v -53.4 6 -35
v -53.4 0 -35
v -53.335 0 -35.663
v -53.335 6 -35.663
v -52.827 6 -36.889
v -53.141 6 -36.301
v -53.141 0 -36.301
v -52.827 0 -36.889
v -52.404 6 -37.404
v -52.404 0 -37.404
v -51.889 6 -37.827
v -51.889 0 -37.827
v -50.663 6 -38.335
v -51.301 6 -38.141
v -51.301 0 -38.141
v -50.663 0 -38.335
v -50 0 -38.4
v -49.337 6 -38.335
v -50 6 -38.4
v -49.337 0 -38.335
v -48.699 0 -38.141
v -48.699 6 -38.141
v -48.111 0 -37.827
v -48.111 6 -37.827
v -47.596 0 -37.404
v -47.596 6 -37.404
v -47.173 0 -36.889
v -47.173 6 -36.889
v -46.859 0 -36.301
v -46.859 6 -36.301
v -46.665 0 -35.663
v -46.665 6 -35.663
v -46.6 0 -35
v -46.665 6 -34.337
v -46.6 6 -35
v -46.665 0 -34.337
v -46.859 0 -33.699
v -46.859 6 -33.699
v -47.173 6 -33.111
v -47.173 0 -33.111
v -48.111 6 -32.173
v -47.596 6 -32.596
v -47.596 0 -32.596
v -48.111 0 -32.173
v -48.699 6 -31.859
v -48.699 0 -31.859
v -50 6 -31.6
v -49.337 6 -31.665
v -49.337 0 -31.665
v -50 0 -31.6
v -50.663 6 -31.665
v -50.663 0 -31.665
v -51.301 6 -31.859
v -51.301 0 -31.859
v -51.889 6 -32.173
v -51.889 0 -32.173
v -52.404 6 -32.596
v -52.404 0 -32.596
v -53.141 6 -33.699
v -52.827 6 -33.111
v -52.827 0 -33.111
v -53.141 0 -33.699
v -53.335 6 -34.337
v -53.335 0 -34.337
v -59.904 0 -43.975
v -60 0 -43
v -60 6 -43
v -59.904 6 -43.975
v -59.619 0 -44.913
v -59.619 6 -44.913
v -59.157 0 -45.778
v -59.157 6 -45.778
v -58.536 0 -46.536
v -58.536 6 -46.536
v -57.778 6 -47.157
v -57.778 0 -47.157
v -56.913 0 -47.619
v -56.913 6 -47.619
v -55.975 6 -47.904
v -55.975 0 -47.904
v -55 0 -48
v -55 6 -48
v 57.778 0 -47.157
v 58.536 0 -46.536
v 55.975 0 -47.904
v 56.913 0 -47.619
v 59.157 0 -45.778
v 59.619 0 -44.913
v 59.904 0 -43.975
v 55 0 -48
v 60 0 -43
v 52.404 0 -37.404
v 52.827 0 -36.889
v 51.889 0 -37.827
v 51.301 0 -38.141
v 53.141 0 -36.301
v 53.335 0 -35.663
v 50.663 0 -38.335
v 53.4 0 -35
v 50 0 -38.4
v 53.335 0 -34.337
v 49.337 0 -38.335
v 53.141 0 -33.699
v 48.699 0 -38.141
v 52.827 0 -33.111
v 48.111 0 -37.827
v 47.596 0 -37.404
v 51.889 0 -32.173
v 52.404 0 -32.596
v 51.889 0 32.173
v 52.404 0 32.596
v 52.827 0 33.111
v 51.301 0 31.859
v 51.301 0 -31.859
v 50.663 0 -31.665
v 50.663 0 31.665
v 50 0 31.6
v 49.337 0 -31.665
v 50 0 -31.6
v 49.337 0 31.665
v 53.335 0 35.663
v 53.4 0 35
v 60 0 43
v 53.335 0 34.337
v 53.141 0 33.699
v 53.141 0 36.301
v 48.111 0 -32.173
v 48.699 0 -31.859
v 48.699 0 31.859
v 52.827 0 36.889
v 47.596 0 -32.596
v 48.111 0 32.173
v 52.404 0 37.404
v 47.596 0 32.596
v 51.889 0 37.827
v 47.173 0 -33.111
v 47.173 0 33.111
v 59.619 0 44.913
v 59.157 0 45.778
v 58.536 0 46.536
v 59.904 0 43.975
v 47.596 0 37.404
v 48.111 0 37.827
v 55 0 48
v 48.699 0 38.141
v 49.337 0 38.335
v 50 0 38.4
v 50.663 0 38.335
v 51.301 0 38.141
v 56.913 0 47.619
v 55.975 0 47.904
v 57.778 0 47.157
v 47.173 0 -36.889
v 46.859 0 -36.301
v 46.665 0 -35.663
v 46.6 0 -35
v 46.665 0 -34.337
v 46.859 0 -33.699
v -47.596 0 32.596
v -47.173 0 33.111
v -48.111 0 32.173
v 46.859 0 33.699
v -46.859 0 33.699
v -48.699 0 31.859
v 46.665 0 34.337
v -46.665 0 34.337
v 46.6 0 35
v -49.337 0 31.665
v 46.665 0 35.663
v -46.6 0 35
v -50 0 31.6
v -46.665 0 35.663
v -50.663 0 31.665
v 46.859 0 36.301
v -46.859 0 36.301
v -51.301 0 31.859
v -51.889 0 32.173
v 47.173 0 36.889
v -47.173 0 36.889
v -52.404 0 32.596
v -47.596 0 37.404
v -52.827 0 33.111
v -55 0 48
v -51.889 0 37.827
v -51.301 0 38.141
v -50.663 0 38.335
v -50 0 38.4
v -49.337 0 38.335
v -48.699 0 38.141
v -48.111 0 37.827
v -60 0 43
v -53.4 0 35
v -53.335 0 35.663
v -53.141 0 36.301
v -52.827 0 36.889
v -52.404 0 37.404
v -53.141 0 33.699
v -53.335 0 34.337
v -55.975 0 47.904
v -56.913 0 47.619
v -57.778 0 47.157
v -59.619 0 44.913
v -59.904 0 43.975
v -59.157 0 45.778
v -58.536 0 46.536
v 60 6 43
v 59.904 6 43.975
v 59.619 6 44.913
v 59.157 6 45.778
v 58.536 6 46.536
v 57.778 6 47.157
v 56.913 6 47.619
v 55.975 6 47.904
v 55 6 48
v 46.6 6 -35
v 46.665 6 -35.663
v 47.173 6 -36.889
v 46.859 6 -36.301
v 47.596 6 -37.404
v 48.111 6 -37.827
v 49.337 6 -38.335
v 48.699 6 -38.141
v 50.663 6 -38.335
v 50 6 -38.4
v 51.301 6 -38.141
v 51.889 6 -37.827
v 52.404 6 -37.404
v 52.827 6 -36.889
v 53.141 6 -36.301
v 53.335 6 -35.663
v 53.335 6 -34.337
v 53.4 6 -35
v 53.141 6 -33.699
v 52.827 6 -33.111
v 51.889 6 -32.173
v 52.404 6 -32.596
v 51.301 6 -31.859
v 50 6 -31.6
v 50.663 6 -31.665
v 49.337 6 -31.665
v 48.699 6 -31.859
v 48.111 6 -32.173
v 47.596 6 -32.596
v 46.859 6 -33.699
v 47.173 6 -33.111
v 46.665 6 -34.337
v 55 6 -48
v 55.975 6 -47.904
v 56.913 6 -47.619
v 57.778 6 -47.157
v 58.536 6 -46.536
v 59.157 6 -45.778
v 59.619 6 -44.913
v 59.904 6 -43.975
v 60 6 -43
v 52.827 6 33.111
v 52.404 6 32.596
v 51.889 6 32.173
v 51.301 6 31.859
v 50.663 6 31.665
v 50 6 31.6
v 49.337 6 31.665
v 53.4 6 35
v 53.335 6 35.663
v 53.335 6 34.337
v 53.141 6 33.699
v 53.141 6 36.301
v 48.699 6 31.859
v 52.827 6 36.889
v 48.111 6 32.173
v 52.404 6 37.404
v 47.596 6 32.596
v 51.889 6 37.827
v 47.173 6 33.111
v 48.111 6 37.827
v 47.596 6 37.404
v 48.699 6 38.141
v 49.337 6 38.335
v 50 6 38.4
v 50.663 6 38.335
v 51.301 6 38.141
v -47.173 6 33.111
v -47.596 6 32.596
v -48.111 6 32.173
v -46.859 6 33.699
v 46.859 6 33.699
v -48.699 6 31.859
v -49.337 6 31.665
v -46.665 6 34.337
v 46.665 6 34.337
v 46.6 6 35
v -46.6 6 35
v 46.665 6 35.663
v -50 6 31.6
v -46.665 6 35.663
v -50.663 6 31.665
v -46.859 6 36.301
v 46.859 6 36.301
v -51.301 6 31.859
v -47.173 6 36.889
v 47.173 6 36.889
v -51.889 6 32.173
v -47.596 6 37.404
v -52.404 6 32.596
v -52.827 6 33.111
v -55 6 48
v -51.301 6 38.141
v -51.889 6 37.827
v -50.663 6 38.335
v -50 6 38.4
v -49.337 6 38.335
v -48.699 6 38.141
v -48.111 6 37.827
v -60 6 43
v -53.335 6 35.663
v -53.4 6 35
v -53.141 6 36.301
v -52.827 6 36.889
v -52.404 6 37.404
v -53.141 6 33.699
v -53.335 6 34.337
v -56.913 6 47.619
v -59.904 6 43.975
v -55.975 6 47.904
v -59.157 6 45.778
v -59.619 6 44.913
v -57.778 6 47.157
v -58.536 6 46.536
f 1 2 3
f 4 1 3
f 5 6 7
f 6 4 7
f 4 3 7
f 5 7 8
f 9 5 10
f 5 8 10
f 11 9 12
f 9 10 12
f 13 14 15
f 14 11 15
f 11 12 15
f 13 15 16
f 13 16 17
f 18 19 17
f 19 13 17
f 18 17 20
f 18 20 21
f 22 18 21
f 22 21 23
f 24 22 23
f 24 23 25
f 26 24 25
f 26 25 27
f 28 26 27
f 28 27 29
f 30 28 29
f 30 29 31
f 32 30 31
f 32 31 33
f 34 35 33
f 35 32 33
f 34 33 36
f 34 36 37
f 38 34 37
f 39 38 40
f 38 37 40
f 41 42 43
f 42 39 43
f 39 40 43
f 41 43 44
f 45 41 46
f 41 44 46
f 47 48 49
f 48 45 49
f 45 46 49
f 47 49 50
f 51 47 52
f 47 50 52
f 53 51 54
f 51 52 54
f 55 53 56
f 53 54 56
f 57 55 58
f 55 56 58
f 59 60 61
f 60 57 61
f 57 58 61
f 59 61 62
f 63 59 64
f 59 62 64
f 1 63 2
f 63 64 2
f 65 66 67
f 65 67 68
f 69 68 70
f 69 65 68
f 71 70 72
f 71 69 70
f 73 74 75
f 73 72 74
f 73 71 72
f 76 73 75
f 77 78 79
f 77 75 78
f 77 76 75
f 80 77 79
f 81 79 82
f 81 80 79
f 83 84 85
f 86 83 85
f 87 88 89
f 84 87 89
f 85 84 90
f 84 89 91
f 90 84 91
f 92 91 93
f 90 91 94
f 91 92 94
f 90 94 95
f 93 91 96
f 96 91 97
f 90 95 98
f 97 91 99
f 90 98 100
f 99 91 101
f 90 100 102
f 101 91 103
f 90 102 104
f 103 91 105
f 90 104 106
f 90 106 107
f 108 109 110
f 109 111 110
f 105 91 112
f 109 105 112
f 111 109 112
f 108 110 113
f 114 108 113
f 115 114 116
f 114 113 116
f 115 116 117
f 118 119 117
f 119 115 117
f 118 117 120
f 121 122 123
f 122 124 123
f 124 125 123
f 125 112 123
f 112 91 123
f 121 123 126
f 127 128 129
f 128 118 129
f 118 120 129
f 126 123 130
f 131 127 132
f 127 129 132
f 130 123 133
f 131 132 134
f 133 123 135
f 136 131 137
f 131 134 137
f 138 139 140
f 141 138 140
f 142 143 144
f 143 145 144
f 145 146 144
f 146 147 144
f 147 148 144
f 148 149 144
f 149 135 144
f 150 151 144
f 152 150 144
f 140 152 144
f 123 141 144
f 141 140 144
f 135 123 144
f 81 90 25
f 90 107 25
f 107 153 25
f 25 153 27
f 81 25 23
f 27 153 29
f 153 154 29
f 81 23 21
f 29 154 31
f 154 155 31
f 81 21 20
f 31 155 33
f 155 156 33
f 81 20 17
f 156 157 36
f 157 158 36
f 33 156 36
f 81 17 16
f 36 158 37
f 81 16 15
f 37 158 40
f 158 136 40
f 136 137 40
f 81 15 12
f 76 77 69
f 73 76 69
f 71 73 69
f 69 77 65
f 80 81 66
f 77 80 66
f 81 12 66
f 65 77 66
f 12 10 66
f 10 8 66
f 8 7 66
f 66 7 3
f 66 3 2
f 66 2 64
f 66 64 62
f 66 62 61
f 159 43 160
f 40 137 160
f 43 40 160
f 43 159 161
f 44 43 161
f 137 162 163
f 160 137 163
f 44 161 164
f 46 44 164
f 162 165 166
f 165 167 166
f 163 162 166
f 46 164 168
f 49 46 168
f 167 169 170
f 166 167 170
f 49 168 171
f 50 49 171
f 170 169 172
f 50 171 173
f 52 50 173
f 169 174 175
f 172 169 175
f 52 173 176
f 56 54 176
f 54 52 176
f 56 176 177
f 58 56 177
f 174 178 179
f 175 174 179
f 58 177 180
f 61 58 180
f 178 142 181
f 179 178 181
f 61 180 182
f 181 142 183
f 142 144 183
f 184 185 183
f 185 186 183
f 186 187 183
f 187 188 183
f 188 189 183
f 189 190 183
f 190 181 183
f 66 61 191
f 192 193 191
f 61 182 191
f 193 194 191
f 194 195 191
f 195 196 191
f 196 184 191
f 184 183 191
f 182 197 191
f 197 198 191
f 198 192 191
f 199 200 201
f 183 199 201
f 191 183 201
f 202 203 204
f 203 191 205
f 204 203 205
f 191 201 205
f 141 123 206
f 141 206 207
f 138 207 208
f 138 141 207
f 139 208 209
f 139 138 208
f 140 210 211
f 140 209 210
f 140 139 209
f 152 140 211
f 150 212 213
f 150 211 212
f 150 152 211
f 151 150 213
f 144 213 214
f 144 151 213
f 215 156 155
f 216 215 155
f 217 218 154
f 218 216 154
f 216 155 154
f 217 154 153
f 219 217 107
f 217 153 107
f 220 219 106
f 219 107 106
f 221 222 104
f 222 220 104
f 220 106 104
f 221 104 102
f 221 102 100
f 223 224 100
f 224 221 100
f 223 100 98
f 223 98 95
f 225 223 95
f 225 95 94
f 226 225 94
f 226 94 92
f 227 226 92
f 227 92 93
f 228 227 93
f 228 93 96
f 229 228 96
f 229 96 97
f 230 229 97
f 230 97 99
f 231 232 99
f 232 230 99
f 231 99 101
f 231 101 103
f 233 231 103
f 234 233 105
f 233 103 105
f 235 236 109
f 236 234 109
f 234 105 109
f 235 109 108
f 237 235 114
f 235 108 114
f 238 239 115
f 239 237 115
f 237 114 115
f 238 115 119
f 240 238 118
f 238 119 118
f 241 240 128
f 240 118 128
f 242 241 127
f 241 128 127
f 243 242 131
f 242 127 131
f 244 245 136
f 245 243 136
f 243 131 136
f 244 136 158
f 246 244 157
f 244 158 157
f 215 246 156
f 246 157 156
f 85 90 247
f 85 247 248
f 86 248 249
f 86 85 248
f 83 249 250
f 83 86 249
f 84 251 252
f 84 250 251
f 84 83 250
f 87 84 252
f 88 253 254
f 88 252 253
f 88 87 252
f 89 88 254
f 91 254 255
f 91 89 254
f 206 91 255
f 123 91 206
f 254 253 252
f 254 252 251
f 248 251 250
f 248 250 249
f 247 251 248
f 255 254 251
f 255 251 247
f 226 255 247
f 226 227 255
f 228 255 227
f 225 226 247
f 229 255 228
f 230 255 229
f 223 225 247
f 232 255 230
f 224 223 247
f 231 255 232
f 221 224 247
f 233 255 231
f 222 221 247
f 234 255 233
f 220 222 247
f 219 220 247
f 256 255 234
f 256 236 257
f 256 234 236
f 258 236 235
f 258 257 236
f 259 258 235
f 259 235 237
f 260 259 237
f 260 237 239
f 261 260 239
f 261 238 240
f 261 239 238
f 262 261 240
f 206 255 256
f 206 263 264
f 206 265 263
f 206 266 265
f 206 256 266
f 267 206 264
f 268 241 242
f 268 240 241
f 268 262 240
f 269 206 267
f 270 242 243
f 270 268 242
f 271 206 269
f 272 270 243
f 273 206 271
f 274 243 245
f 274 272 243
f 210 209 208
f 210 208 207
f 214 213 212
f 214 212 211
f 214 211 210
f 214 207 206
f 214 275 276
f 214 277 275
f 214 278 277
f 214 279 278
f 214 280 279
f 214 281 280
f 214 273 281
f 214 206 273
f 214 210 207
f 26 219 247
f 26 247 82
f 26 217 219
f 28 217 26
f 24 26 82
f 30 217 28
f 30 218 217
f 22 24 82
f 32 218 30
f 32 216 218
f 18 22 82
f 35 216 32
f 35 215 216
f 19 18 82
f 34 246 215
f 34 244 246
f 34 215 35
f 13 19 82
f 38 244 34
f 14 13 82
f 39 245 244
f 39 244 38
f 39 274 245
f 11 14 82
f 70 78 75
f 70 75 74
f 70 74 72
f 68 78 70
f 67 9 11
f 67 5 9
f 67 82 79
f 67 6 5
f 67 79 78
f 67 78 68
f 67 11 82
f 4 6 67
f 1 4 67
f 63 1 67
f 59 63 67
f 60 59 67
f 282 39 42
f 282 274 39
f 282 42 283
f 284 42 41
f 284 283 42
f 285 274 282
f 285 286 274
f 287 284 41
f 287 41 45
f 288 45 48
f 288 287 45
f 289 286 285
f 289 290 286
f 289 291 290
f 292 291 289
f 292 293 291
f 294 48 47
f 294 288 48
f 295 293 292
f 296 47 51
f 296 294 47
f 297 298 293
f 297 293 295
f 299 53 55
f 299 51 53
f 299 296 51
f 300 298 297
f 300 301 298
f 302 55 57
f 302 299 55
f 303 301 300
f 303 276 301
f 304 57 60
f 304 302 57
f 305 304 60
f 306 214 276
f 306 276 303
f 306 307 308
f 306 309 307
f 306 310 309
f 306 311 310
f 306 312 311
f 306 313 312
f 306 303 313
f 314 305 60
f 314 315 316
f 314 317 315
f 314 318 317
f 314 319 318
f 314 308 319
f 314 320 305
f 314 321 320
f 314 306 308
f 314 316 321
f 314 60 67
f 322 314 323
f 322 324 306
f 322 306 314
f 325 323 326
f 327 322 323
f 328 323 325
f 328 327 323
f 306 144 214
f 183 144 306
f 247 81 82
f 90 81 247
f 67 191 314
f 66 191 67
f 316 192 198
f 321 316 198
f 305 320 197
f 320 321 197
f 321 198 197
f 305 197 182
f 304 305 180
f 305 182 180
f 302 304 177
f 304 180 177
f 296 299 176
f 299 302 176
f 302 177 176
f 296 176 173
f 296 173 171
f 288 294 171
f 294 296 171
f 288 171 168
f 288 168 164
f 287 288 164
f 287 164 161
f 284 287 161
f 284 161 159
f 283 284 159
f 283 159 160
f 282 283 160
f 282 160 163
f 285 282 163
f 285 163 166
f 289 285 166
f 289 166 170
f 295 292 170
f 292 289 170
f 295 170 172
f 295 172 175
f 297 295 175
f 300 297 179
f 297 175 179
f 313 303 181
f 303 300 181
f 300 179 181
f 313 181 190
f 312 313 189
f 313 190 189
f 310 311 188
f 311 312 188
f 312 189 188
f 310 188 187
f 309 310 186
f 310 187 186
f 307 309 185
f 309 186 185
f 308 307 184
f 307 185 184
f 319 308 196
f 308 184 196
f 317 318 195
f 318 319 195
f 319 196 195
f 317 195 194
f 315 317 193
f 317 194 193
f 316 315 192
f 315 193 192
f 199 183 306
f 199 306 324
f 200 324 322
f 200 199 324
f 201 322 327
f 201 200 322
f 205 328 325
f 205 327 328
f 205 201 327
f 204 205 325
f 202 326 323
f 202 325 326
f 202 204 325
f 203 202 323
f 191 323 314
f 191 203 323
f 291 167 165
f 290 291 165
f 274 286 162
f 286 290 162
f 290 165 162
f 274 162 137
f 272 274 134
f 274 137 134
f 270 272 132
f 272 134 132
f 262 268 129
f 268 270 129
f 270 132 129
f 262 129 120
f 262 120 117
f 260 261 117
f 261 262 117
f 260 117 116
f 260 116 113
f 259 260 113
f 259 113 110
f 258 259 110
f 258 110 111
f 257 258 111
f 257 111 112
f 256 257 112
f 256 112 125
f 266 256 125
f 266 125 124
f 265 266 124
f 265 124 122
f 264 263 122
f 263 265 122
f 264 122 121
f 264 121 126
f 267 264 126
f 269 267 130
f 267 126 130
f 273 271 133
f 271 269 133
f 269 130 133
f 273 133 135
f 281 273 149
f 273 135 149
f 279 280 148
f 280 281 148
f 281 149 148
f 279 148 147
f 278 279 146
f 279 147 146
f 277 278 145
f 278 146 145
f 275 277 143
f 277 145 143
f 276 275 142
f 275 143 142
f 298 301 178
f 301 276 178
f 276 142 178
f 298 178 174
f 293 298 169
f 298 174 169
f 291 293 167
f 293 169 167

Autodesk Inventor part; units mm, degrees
ref_plane "YZ Plane" through (0, 0, 0) normal (1, 0, 0) x (0, 1, 0)
ref_plane "XZ Plane" through (0, 0, 0) normal (0, 1, 0) x (-1, 0, 0)
ref_plane "XY Plane" through (0, 0, 0) normal (0, 0, 1) x (1, 0, 0)
sketch "Sketch1" plane through (0, 0, 0) normal (0, 1, 0) x (-1, 0, 0)
  line L0 (55, -48) -> (-55, -48)
  line L1 (-60, -43) -> (-60, 43)
  line L2 (-55, 48) -> (55, 48)
  line L3 (60, 43) -> (60, -43)
  line L4 (50, -35) -> (-50, -35) construction
  line L5 (-50, -35) -> (-50, 35) construction
  line L6 (-50, 35) -> (50, 35) construction
  line L7 (50, 35) -> (50, -35) construction
  arc A0 (60, 43) -> (55, 48) centre (55, 43) ccw
  arc A1 (-55, 48) -> (-60, 43) centre (-55, 43) ccw
  arc A2 (-60, -43) -> (-55, -48) centre (-55, -43) ccw
  arc A3 (55, -48) -> (60, -43) centre (55, -43) ccw
  circle A4 centre (50, -35) radius 3.4
  circle A5 centre (50, 35) radius 3.4
  circle A6 centre (-50, -35) radius 3.4
  circle A7 centre (-50, 35) radius 3.4
  line L8 (0, -20) -> (0, 20) construction
  line L9 (25, -20) -> (25, 20) construction
  line L10 (-25, 20) -> (-25, -20) construction
  arc A8 (-25, -20) -> (25, -20) centre (0, -20) ccw construction
  arc A9 (25, 20) -> (-25, 20) centre (0, 20) ccw construction
  point P0 (0, 0)
  point P1 (-60, 0)
  point P2 (0, -48)
  point P3 (0, -35)
  point P4 (-50, 0)
  point P5 (0, 0)
  dimension "d0" = 96
  dimension "d1" = 120
  dimension "d2" = 70
  dimension "d3" = 100
  dimension "d4" = 5
  dimension "d5" = 6.8
  dimension "d6" = 6.8
  dimension "d8" = 6.8
  dimension "d10" = 6.8
  dimension "d13" = 25
  dimension "d14" = 40
extrude "Extrusion1" add sketch "Sketch1" along normal blind 6
equation "\"d0\" = moduleHeight"
equation "\"d1\" = moduleWidth"
equation "\"d2\" = moduleMountH"
equation "\"d3\" = moduleMountW"
equation "\"d4\" = moduleCornerR"
equation "\"d5\" = moduleMountD"
equation "\"d6\" = moduleMountD"
equation "\"d8\" = moduleMountD"
equation "\"d10\" = moduleMountD"
equation "\"d13\" = moduleOpeningR"
equation "\"d14\" = moduleOpeningH"
equation "\"d15\" = thickness"
equation "\"moduleWidth\" = 120"
equation "\"moduleHeight\" = 96"
equation "\"moduleMountW\" = 100"
equation "\"moduleMountH\" = 70"
equation "\"moduleMountD\" = 6.8"
equation "\"moduleCornerR\" = 5"
equation "\"moduleOpeningR\" = 25"
equation "\"moduleOpeningH\" = 40"
equation "\"thickness\" = 6"
properties part number "Module_base"
